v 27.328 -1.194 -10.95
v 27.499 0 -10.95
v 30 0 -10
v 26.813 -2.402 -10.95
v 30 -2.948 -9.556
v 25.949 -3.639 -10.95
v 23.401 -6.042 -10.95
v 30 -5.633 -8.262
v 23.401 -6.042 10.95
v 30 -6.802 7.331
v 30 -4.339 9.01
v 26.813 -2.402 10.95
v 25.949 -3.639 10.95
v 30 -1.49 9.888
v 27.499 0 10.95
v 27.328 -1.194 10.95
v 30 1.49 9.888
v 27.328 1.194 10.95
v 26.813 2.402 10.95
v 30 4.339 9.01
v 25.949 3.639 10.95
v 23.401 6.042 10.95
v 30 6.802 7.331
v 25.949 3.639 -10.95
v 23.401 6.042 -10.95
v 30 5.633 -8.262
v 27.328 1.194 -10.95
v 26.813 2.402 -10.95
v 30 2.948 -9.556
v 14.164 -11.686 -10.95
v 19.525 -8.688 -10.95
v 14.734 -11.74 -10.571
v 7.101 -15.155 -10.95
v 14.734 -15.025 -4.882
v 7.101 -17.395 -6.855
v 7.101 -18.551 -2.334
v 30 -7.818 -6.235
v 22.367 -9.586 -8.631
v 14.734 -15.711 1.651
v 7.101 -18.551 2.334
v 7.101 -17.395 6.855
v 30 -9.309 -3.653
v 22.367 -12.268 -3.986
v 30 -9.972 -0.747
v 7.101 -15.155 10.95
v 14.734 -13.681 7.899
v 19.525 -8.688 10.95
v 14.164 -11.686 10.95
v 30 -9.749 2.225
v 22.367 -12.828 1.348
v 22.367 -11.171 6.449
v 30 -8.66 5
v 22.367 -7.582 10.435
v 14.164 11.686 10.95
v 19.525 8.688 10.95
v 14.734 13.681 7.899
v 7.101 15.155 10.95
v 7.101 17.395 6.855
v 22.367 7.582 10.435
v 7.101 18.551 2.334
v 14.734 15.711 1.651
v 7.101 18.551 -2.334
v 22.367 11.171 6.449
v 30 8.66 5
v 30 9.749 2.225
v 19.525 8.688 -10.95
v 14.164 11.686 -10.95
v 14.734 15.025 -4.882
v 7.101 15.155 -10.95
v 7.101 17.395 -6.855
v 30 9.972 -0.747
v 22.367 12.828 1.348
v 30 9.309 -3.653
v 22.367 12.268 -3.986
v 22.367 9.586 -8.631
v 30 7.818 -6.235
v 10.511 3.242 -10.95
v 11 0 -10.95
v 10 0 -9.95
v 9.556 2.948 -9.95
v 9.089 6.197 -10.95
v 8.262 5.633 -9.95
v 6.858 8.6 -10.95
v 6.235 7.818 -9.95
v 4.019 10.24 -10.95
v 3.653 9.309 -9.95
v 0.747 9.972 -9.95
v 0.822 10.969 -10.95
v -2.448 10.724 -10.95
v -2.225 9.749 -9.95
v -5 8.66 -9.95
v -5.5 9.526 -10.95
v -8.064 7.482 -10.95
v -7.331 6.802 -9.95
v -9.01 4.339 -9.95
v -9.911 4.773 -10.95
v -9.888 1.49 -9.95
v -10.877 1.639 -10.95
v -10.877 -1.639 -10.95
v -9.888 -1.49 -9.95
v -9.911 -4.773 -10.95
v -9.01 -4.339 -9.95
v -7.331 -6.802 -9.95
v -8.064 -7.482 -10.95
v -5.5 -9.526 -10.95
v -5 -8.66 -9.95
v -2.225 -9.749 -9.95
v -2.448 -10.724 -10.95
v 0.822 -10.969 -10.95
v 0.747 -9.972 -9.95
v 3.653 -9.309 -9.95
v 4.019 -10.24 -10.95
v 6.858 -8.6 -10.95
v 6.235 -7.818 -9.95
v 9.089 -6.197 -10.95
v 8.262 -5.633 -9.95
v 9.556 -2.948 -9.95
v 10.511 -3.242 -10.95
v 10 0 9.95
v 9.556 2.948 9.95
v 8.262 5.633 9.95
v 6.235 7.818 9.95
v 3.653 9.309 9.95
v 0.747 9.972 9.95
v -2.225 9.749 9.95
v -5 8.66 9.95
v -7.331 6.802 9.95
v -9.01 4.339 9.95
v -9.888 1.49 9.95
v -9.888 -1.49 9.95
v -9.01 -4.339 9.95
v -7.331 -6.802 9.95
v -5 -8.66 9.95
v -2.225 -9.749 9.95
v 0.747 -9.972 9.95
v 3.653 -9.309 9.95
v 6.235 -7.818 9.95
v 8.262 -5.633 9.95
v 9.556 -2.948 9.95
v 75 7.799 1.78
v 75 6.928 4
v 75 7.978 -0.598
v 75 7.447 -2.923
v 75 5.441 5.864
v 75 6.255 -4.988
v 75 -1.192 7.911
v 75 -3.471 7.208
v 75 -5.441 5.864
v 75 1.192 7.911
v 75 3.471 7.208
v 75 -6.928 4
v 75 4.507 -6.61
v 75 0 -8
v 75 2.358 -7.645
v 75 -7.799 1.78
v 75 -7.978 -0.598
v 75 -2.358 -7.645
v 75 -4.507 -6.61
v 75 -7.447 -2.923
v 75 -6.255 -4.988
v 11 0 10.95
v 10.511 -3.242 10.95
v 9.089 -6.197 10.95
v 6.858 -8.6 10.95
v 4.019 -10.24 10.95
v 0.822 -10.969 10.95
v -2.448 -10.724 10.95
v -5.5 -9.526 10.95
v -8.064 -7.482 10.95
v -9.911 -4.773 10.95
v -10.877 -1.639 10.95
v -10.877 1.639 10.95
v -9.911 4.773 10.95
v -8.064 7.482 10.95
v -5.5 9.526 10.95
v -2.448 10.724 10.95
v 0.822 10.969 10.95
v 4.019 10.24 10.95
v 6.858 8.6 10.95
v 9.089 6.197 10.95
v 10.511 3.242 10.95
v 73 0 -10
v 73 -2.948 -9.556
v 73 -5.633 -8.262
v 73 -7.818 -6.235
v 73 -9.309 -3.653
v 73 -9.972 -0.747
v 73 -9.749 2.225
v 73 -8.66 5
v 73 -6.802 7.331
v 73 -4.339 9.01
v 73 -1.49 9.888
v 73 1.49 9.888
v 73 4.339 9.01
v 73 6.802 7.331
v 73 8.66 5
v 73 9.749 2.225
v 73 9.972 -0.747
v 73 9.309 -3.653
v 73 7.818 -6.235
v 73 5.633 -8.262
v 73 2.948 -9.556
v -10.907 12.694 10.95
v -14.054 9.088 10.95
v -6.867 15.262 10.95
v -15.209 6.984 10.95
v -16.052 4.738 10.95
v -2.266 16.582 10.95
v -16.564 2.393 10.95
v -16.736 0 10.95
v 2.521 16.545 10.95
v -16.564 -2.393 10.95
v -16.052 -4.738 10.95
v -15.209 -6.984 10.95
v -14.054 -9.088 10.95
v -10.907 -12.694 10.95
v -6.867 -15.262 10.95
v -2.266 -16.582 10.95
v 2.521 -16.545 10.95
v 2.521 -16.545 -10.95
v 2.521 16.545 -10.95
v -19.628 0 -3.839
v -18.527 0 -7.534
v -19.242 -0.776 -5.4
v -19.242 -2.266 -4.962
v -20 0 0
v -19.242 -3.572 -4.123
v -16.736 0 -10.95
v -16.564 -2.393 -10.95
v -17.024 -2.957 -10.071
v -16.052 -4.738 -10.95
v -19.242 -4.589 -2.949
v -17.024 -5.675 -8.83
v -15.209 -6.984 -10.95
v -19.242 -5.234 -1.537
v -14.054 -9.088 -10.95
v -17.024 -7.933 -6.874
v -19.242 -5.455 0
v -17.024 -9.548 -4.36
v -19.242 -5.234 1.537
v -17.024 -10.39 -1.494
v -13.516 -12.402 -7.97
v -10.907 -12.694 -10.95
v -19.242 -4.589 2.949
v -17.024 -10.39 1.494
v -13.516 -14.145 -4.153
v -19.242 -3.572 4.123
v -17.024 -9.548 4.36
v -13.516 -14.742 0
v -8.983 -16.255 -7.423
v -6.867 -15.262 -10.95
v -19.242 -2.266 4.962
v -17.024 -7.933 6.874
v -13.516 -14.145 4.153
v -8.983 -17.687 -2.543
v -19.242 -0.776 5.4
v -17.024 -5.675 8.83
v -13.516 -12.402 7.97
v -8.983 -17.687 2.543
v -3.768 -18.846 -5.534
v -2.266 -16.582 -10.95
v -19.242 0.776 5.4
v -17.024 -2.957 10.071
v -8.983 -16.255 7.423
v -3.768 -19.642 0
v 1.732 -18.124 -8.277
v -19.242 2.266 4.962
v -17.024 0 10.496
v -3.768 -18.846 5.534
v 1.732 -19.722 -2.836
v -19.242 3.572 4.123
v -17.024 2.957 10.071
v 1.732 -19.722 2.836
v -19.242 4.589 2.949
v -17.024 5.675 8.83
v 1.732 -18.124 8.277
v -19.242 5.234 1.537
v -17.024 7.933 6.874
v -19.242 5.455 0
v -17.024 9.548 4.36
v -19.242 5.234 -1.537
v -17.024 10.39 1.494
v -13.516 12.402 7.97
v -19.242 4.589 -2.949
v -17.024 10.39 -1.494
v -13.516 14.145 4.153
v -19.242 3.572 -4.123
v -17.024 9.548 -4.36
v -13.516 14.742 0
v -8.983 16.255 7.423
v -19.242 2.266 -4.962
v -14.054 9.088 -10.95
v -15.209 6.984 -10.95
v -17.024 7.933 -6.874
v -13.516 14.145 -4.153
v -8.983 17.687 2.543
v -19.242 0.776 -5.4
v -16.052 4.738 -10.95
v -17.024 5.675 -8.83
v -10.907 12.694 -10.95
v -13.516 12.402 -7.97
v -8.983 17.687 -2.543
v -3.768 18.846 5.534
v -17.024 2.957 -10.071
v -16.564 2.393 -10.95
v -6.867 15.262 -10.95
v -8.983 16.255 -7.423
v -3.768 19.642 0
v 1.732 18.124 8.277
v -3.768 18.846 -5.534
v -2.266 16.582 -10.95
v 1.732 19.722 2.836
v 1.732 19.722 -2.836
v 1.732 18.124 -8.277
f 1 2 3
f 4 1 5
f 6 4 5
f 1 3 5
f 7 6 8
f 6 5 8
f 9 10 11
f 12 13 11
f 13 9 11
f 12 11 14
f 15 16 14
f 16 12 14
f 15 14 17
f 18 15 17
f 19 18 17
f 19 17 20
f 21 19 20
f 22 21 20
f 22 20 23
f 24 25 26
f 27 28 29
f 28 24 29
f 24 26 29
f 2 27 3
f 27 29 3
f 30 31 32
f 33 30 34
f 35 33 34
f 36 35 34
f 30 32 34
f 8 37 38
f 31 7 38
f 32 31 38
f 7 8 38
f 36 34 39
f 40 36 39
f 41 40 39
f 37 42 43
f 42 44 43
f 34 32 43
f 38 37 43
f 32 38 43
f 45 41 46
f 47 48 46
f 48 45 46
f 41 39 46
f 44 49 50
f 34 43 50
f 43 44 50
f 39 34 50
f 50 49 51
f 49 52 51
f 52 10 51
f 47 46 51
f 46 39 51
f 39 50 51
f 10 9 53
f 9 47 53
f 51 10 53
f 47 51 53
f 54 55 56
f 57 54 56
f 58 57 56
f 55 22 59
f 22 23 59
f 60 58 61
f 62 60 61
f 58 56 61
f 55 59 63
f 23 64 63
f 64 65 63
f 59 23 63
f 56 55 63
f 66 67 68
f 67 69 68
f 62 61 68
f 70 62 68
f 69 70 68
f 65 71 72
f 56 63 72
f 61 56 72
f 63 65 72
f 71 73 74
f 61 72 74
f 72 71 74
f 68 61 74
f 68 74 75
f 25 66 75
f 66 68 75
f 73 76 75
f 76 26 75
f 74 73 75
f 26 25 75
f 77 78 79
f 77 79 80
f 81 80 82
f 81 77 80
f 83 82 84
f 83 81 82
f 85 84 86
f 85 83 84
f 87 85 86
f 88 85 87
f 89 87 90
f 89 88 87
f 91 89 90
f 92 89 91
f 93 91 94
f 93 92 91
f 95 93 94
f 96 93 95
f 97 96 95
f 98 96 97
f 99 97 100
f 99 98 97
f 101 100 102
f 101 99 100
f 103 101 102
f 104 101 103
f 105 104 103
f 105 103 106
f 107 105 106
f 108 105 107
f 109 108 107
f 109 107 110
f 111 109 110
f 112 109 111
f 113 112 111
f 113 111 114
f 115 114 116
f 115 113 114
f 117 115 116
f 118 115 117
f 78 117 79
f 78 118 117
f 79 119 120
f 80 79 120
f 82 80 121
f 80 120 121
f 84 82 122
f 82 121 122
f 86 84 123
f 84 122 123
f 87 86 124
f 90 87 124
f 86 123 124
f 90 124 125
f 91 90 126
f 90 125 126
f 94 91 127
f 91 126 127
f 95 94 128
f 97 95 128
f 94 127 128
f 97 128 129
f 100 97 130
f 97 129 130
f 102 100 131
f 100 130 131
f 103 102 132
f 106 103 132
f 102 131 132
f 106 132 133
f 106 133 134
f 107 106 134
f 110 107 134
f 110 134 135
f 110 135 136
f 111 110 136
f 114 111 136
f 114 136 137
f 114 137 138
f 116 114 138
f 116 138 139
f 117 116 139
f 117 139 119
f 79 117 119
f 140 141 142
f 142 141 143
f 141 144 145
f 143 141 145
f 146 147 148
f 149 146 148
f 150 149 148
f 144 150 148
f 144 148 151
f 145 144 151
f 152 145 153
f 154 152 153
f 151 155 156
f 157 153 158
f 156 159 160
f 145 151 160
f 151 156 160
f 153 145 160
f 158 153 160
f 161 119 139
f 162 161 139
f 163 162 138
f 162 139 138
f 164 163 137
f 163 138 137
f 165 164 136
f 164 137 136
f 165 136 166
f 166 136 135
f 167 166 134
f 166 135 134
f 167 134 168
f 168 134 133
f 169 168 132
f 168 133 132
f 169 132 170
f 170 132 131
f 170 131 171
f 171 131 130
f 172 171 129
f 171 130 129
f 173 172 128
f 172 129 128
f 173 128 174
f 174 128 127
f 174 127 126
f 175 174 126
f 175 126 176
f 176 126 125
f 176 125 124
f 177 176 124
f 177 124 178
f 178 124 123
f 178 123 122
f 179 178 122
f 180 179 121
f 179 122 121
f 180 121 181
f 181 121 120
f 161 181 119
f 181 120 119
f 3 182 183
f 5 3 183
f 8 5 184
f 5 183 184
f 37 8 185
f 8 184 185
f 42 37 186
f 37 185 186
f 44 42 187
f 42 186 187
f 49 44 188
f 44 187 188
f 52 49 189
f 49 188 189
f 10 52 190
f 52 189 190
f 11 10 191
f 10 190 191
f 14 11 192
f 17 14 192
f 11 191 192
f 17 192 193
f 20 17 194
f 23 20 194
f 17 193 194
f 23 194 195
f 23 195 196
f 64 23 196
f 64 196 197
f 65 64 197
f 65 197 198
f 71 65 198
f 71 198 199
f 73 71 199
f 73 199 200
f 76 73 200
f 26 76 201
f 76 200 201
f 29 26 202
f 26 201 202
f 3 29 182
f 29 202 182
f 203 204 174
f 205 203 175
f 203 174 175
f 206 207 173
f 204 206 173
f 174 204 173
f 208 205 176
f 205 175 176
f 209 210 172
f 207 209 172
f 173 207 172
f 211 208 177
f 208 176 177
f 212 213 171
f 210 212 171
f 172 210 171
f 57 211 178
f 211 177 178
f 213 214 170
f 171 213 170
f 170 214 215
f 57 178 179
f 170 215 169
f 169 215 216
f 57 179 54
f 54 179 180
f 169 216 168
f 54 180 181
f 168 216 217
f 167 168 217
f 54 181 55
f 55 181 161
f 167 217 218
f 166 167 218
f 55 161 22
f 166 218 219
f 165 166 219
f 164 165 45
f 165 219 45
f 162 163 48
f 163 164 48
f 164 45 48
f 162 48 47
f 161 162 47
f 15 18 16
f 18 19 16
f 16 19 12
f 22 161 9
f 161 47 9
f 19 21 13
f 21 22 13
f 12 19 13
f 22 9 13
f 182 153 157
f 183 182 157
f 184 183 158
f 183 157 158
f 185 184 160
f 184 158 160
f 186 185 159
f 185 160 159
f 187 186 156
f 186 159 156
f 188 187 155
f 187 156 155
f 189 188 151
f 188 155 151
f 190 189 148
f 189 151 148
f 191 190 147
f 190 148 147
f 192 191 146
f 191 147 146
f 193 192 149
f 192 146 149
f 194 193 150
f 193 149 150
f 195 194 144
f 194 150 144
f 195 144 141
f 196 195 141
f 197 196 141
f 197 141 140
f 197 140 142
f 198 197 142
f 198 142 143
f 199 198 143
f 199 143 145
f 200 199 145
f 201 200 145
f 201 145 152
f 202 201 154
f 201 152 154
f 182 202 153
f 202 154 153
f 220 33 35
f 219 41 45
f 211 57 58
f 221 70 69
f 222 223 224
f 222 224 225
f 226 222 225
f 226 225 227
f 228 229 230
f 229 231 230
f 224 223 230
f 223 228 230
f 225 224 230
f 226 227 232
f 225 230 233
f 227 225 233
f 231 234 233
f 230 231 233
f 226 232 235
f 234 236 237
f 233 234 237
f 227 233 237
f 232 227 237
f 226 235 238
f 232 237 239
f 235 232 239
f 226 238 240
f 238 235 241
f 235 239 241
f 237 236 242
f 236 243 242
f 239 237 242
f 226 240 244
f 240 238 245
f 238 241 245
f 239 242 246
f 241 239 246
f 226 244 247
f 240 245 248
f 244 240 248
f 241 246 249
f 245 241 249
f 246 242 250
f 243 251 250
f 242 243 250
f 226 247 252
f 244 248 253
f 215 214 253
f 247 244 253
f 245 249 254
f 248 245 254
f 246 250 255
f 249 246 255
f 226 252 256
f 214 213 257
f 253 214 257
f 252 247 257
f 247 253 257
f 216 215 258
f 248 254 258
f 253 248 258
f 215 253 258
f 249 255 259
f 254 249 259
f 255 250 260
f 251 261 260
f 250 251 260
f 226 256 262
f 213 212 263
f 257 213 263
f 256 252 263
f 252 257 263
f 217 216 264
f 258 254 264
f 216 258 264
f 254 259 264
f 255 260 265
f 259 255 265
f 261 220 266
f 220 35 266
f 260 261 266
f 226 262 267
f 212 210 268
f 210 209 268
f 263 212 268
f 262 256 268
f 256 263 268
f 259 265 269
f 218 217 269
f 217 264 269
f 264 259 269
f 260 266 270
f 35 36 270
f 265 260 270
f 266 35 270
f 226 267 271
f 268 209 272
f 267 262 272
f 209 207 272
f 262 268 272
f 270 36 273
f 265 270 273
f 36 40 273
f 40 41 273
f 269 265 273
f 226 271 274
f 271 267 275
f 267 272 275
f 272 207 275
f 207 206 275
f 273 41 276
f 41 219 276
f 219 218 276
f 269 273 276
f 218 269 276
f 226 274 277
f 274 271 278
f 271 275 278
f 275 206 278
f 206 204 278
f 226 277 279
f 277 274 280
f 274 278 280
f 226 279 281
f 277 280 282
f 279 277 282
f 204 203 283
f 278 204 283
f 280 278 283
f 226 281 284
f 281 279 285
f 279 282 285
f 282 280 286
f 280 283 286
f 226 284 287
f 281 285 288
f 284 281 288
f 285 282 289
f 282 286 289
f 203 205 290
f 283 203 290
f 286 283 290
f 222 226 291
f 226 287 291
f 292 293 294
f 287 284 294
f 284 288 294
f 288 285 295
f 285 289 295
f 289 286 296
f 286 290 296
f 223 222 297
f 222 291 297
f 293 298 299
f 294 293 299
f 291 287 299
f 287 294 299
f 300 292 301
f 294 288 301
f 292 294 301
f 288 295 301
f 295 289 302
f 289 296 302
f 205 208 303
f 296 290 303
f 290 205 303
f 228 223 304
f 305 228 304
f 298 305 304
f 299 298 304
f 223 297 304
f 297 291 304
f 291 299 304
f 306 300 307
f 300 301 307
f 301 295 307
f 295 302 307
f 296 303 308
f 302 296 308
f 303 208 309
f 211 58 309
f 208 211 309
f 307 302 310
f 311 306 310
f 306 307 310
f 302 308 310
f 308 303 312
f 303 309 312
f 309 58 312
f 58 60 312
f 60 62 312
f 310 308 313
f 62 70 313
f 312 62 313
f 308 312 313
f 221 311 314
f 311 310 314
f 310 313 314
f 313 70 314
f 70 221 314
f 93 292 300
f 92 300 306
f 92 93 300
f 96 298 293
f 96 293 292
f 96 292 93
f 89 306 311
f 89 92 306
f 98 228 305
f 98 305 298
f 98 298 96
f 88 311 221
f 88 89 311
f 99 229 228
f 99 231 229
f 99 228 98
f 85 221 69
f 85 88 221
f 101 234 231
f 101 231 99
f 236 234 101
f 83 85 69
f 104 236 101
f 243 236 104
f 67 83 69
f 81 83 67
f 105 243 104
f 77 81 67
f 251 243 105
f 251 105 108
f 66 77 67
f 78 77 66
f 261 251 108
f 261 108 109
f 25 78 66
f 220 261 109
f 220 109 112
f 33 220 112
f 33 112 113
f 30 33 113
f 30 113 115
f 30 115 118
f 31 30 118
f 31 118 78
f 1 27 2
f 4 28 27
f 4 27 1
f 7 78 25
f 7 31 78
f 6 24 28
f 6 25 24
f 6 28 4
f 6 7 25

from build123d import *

# Parameters (mm, degrees)
SKICA2_OUTSIDE_W              = 119.114
SKICA2_OUTSIDE_H              = 64.114
SKICA2_OUTSIDE_W_2            = 160.751096763
SKICA2_OUTSIDE_H_2            = 21.9
ODEBRAT_VYSUNUT_M1_DEPTH      = 21
ODEBRAT_VYSUNUT_M1_DEPTH_BACK = 21
SKICA3_R                      = 10
ODEBRAT_VYSUNUT_M2_DEPTH      = 11.95
ODEBRAT_VYSUNUT_M2_DEPTH_BACK = 11.95
ZKOSEN_1_SIZE                 = 1
ZKOSEN_2_SIZE                 = 2


with BuildPart() as part:
    # Skica1 → Rotovat1 (revolve)
    with BuildSketch(Plane.XY, mode=Mode.PRIVATE) as rotovat1_sk:
        with BuildLine():
            Line((7.101020514, 18.696938457), (30, 10))
            Line((30, 10), (75, 10))
            Line((75, 10), (75, 0))
            Line((75, 0), (-20, 0))
            ThreePointArc((-20, 0), (-11.357367426, 16.462387589), (7.101020514, 18.696938457))
        make_face()
    revolve(rotovat1_sk.sketch.rotate(Axis((0, 0, 0), (-1, 0, 0)), 90), axis=Axis((0, 0, 0), (-1, 0, 0)))  # turned: the seam where the file's is

    # Skica2 outside → Odebrat vysunutím1 (cut, two sides)
    with BuildSketch(Plane(origin=(0, 0, 0), x_dir=(1, 0, 0), z_dir=(0, 1, 0))) as odebrat_vysunut_m1_sk:
        with Locations((27.5, 0)):
            Rectangle(SKICA2_OUTSIDE_W, SKICA2_OUTSIDE_H)
        with Locations((14.564667135, 0)):
            Rectangle(SKICA2_OUTSIDE_W_2, SKICA2_OUTSIDE_H_2, mode=Mode.SUBTRACT)
    extrude(amount=ODEBRAT_VYSUNUT_M1_DEPTH, mode=Mode.SUBTRACT)
    extrude(odebrat_vysunut_m1_sk.sketch, amount=-ODEBRAT_VYSUNUT_M1_DEPTH_BACK, mode=Mode.SUBTRACT)

    # Skica3 → Odebrat vysunutím2 (cut, two sides)
    with BuildSketch(Plane.XY) as odebrat_vysunut_m2_sk:
        Circle(SKICA3_R)
    extrude(amount=ODEBRAT_VYSUNUT_M2_DEPTH, mode=Mode.SUBTRACT)
    extrude(odebrat_vysunut_m2_sk.sketch, amount=-ODEBRAT_VYSUNUT_M2_DEPTH_BACK, mode=Mode.SUBTRACT)

    # Zkosení1
    zkosen_1_edges = [part.edges().sort_by_distance(p)[0] for p in [
        (-10, 0, -10.95),
        (-10, 0, 10.95),
    ]]
    chamfer(zkosen_1_edges, length=ZKOSEN_1_SIZE)

    # Zkosení2
    zkosen_2_edges = [part.edges().sort_by_distance(p)[0] for p in [
        (75, 0, 10),
    ]]
    chamfer(zkosen_2_edges, length=ZKOSEN_2_SIZE)


solid = part.part
